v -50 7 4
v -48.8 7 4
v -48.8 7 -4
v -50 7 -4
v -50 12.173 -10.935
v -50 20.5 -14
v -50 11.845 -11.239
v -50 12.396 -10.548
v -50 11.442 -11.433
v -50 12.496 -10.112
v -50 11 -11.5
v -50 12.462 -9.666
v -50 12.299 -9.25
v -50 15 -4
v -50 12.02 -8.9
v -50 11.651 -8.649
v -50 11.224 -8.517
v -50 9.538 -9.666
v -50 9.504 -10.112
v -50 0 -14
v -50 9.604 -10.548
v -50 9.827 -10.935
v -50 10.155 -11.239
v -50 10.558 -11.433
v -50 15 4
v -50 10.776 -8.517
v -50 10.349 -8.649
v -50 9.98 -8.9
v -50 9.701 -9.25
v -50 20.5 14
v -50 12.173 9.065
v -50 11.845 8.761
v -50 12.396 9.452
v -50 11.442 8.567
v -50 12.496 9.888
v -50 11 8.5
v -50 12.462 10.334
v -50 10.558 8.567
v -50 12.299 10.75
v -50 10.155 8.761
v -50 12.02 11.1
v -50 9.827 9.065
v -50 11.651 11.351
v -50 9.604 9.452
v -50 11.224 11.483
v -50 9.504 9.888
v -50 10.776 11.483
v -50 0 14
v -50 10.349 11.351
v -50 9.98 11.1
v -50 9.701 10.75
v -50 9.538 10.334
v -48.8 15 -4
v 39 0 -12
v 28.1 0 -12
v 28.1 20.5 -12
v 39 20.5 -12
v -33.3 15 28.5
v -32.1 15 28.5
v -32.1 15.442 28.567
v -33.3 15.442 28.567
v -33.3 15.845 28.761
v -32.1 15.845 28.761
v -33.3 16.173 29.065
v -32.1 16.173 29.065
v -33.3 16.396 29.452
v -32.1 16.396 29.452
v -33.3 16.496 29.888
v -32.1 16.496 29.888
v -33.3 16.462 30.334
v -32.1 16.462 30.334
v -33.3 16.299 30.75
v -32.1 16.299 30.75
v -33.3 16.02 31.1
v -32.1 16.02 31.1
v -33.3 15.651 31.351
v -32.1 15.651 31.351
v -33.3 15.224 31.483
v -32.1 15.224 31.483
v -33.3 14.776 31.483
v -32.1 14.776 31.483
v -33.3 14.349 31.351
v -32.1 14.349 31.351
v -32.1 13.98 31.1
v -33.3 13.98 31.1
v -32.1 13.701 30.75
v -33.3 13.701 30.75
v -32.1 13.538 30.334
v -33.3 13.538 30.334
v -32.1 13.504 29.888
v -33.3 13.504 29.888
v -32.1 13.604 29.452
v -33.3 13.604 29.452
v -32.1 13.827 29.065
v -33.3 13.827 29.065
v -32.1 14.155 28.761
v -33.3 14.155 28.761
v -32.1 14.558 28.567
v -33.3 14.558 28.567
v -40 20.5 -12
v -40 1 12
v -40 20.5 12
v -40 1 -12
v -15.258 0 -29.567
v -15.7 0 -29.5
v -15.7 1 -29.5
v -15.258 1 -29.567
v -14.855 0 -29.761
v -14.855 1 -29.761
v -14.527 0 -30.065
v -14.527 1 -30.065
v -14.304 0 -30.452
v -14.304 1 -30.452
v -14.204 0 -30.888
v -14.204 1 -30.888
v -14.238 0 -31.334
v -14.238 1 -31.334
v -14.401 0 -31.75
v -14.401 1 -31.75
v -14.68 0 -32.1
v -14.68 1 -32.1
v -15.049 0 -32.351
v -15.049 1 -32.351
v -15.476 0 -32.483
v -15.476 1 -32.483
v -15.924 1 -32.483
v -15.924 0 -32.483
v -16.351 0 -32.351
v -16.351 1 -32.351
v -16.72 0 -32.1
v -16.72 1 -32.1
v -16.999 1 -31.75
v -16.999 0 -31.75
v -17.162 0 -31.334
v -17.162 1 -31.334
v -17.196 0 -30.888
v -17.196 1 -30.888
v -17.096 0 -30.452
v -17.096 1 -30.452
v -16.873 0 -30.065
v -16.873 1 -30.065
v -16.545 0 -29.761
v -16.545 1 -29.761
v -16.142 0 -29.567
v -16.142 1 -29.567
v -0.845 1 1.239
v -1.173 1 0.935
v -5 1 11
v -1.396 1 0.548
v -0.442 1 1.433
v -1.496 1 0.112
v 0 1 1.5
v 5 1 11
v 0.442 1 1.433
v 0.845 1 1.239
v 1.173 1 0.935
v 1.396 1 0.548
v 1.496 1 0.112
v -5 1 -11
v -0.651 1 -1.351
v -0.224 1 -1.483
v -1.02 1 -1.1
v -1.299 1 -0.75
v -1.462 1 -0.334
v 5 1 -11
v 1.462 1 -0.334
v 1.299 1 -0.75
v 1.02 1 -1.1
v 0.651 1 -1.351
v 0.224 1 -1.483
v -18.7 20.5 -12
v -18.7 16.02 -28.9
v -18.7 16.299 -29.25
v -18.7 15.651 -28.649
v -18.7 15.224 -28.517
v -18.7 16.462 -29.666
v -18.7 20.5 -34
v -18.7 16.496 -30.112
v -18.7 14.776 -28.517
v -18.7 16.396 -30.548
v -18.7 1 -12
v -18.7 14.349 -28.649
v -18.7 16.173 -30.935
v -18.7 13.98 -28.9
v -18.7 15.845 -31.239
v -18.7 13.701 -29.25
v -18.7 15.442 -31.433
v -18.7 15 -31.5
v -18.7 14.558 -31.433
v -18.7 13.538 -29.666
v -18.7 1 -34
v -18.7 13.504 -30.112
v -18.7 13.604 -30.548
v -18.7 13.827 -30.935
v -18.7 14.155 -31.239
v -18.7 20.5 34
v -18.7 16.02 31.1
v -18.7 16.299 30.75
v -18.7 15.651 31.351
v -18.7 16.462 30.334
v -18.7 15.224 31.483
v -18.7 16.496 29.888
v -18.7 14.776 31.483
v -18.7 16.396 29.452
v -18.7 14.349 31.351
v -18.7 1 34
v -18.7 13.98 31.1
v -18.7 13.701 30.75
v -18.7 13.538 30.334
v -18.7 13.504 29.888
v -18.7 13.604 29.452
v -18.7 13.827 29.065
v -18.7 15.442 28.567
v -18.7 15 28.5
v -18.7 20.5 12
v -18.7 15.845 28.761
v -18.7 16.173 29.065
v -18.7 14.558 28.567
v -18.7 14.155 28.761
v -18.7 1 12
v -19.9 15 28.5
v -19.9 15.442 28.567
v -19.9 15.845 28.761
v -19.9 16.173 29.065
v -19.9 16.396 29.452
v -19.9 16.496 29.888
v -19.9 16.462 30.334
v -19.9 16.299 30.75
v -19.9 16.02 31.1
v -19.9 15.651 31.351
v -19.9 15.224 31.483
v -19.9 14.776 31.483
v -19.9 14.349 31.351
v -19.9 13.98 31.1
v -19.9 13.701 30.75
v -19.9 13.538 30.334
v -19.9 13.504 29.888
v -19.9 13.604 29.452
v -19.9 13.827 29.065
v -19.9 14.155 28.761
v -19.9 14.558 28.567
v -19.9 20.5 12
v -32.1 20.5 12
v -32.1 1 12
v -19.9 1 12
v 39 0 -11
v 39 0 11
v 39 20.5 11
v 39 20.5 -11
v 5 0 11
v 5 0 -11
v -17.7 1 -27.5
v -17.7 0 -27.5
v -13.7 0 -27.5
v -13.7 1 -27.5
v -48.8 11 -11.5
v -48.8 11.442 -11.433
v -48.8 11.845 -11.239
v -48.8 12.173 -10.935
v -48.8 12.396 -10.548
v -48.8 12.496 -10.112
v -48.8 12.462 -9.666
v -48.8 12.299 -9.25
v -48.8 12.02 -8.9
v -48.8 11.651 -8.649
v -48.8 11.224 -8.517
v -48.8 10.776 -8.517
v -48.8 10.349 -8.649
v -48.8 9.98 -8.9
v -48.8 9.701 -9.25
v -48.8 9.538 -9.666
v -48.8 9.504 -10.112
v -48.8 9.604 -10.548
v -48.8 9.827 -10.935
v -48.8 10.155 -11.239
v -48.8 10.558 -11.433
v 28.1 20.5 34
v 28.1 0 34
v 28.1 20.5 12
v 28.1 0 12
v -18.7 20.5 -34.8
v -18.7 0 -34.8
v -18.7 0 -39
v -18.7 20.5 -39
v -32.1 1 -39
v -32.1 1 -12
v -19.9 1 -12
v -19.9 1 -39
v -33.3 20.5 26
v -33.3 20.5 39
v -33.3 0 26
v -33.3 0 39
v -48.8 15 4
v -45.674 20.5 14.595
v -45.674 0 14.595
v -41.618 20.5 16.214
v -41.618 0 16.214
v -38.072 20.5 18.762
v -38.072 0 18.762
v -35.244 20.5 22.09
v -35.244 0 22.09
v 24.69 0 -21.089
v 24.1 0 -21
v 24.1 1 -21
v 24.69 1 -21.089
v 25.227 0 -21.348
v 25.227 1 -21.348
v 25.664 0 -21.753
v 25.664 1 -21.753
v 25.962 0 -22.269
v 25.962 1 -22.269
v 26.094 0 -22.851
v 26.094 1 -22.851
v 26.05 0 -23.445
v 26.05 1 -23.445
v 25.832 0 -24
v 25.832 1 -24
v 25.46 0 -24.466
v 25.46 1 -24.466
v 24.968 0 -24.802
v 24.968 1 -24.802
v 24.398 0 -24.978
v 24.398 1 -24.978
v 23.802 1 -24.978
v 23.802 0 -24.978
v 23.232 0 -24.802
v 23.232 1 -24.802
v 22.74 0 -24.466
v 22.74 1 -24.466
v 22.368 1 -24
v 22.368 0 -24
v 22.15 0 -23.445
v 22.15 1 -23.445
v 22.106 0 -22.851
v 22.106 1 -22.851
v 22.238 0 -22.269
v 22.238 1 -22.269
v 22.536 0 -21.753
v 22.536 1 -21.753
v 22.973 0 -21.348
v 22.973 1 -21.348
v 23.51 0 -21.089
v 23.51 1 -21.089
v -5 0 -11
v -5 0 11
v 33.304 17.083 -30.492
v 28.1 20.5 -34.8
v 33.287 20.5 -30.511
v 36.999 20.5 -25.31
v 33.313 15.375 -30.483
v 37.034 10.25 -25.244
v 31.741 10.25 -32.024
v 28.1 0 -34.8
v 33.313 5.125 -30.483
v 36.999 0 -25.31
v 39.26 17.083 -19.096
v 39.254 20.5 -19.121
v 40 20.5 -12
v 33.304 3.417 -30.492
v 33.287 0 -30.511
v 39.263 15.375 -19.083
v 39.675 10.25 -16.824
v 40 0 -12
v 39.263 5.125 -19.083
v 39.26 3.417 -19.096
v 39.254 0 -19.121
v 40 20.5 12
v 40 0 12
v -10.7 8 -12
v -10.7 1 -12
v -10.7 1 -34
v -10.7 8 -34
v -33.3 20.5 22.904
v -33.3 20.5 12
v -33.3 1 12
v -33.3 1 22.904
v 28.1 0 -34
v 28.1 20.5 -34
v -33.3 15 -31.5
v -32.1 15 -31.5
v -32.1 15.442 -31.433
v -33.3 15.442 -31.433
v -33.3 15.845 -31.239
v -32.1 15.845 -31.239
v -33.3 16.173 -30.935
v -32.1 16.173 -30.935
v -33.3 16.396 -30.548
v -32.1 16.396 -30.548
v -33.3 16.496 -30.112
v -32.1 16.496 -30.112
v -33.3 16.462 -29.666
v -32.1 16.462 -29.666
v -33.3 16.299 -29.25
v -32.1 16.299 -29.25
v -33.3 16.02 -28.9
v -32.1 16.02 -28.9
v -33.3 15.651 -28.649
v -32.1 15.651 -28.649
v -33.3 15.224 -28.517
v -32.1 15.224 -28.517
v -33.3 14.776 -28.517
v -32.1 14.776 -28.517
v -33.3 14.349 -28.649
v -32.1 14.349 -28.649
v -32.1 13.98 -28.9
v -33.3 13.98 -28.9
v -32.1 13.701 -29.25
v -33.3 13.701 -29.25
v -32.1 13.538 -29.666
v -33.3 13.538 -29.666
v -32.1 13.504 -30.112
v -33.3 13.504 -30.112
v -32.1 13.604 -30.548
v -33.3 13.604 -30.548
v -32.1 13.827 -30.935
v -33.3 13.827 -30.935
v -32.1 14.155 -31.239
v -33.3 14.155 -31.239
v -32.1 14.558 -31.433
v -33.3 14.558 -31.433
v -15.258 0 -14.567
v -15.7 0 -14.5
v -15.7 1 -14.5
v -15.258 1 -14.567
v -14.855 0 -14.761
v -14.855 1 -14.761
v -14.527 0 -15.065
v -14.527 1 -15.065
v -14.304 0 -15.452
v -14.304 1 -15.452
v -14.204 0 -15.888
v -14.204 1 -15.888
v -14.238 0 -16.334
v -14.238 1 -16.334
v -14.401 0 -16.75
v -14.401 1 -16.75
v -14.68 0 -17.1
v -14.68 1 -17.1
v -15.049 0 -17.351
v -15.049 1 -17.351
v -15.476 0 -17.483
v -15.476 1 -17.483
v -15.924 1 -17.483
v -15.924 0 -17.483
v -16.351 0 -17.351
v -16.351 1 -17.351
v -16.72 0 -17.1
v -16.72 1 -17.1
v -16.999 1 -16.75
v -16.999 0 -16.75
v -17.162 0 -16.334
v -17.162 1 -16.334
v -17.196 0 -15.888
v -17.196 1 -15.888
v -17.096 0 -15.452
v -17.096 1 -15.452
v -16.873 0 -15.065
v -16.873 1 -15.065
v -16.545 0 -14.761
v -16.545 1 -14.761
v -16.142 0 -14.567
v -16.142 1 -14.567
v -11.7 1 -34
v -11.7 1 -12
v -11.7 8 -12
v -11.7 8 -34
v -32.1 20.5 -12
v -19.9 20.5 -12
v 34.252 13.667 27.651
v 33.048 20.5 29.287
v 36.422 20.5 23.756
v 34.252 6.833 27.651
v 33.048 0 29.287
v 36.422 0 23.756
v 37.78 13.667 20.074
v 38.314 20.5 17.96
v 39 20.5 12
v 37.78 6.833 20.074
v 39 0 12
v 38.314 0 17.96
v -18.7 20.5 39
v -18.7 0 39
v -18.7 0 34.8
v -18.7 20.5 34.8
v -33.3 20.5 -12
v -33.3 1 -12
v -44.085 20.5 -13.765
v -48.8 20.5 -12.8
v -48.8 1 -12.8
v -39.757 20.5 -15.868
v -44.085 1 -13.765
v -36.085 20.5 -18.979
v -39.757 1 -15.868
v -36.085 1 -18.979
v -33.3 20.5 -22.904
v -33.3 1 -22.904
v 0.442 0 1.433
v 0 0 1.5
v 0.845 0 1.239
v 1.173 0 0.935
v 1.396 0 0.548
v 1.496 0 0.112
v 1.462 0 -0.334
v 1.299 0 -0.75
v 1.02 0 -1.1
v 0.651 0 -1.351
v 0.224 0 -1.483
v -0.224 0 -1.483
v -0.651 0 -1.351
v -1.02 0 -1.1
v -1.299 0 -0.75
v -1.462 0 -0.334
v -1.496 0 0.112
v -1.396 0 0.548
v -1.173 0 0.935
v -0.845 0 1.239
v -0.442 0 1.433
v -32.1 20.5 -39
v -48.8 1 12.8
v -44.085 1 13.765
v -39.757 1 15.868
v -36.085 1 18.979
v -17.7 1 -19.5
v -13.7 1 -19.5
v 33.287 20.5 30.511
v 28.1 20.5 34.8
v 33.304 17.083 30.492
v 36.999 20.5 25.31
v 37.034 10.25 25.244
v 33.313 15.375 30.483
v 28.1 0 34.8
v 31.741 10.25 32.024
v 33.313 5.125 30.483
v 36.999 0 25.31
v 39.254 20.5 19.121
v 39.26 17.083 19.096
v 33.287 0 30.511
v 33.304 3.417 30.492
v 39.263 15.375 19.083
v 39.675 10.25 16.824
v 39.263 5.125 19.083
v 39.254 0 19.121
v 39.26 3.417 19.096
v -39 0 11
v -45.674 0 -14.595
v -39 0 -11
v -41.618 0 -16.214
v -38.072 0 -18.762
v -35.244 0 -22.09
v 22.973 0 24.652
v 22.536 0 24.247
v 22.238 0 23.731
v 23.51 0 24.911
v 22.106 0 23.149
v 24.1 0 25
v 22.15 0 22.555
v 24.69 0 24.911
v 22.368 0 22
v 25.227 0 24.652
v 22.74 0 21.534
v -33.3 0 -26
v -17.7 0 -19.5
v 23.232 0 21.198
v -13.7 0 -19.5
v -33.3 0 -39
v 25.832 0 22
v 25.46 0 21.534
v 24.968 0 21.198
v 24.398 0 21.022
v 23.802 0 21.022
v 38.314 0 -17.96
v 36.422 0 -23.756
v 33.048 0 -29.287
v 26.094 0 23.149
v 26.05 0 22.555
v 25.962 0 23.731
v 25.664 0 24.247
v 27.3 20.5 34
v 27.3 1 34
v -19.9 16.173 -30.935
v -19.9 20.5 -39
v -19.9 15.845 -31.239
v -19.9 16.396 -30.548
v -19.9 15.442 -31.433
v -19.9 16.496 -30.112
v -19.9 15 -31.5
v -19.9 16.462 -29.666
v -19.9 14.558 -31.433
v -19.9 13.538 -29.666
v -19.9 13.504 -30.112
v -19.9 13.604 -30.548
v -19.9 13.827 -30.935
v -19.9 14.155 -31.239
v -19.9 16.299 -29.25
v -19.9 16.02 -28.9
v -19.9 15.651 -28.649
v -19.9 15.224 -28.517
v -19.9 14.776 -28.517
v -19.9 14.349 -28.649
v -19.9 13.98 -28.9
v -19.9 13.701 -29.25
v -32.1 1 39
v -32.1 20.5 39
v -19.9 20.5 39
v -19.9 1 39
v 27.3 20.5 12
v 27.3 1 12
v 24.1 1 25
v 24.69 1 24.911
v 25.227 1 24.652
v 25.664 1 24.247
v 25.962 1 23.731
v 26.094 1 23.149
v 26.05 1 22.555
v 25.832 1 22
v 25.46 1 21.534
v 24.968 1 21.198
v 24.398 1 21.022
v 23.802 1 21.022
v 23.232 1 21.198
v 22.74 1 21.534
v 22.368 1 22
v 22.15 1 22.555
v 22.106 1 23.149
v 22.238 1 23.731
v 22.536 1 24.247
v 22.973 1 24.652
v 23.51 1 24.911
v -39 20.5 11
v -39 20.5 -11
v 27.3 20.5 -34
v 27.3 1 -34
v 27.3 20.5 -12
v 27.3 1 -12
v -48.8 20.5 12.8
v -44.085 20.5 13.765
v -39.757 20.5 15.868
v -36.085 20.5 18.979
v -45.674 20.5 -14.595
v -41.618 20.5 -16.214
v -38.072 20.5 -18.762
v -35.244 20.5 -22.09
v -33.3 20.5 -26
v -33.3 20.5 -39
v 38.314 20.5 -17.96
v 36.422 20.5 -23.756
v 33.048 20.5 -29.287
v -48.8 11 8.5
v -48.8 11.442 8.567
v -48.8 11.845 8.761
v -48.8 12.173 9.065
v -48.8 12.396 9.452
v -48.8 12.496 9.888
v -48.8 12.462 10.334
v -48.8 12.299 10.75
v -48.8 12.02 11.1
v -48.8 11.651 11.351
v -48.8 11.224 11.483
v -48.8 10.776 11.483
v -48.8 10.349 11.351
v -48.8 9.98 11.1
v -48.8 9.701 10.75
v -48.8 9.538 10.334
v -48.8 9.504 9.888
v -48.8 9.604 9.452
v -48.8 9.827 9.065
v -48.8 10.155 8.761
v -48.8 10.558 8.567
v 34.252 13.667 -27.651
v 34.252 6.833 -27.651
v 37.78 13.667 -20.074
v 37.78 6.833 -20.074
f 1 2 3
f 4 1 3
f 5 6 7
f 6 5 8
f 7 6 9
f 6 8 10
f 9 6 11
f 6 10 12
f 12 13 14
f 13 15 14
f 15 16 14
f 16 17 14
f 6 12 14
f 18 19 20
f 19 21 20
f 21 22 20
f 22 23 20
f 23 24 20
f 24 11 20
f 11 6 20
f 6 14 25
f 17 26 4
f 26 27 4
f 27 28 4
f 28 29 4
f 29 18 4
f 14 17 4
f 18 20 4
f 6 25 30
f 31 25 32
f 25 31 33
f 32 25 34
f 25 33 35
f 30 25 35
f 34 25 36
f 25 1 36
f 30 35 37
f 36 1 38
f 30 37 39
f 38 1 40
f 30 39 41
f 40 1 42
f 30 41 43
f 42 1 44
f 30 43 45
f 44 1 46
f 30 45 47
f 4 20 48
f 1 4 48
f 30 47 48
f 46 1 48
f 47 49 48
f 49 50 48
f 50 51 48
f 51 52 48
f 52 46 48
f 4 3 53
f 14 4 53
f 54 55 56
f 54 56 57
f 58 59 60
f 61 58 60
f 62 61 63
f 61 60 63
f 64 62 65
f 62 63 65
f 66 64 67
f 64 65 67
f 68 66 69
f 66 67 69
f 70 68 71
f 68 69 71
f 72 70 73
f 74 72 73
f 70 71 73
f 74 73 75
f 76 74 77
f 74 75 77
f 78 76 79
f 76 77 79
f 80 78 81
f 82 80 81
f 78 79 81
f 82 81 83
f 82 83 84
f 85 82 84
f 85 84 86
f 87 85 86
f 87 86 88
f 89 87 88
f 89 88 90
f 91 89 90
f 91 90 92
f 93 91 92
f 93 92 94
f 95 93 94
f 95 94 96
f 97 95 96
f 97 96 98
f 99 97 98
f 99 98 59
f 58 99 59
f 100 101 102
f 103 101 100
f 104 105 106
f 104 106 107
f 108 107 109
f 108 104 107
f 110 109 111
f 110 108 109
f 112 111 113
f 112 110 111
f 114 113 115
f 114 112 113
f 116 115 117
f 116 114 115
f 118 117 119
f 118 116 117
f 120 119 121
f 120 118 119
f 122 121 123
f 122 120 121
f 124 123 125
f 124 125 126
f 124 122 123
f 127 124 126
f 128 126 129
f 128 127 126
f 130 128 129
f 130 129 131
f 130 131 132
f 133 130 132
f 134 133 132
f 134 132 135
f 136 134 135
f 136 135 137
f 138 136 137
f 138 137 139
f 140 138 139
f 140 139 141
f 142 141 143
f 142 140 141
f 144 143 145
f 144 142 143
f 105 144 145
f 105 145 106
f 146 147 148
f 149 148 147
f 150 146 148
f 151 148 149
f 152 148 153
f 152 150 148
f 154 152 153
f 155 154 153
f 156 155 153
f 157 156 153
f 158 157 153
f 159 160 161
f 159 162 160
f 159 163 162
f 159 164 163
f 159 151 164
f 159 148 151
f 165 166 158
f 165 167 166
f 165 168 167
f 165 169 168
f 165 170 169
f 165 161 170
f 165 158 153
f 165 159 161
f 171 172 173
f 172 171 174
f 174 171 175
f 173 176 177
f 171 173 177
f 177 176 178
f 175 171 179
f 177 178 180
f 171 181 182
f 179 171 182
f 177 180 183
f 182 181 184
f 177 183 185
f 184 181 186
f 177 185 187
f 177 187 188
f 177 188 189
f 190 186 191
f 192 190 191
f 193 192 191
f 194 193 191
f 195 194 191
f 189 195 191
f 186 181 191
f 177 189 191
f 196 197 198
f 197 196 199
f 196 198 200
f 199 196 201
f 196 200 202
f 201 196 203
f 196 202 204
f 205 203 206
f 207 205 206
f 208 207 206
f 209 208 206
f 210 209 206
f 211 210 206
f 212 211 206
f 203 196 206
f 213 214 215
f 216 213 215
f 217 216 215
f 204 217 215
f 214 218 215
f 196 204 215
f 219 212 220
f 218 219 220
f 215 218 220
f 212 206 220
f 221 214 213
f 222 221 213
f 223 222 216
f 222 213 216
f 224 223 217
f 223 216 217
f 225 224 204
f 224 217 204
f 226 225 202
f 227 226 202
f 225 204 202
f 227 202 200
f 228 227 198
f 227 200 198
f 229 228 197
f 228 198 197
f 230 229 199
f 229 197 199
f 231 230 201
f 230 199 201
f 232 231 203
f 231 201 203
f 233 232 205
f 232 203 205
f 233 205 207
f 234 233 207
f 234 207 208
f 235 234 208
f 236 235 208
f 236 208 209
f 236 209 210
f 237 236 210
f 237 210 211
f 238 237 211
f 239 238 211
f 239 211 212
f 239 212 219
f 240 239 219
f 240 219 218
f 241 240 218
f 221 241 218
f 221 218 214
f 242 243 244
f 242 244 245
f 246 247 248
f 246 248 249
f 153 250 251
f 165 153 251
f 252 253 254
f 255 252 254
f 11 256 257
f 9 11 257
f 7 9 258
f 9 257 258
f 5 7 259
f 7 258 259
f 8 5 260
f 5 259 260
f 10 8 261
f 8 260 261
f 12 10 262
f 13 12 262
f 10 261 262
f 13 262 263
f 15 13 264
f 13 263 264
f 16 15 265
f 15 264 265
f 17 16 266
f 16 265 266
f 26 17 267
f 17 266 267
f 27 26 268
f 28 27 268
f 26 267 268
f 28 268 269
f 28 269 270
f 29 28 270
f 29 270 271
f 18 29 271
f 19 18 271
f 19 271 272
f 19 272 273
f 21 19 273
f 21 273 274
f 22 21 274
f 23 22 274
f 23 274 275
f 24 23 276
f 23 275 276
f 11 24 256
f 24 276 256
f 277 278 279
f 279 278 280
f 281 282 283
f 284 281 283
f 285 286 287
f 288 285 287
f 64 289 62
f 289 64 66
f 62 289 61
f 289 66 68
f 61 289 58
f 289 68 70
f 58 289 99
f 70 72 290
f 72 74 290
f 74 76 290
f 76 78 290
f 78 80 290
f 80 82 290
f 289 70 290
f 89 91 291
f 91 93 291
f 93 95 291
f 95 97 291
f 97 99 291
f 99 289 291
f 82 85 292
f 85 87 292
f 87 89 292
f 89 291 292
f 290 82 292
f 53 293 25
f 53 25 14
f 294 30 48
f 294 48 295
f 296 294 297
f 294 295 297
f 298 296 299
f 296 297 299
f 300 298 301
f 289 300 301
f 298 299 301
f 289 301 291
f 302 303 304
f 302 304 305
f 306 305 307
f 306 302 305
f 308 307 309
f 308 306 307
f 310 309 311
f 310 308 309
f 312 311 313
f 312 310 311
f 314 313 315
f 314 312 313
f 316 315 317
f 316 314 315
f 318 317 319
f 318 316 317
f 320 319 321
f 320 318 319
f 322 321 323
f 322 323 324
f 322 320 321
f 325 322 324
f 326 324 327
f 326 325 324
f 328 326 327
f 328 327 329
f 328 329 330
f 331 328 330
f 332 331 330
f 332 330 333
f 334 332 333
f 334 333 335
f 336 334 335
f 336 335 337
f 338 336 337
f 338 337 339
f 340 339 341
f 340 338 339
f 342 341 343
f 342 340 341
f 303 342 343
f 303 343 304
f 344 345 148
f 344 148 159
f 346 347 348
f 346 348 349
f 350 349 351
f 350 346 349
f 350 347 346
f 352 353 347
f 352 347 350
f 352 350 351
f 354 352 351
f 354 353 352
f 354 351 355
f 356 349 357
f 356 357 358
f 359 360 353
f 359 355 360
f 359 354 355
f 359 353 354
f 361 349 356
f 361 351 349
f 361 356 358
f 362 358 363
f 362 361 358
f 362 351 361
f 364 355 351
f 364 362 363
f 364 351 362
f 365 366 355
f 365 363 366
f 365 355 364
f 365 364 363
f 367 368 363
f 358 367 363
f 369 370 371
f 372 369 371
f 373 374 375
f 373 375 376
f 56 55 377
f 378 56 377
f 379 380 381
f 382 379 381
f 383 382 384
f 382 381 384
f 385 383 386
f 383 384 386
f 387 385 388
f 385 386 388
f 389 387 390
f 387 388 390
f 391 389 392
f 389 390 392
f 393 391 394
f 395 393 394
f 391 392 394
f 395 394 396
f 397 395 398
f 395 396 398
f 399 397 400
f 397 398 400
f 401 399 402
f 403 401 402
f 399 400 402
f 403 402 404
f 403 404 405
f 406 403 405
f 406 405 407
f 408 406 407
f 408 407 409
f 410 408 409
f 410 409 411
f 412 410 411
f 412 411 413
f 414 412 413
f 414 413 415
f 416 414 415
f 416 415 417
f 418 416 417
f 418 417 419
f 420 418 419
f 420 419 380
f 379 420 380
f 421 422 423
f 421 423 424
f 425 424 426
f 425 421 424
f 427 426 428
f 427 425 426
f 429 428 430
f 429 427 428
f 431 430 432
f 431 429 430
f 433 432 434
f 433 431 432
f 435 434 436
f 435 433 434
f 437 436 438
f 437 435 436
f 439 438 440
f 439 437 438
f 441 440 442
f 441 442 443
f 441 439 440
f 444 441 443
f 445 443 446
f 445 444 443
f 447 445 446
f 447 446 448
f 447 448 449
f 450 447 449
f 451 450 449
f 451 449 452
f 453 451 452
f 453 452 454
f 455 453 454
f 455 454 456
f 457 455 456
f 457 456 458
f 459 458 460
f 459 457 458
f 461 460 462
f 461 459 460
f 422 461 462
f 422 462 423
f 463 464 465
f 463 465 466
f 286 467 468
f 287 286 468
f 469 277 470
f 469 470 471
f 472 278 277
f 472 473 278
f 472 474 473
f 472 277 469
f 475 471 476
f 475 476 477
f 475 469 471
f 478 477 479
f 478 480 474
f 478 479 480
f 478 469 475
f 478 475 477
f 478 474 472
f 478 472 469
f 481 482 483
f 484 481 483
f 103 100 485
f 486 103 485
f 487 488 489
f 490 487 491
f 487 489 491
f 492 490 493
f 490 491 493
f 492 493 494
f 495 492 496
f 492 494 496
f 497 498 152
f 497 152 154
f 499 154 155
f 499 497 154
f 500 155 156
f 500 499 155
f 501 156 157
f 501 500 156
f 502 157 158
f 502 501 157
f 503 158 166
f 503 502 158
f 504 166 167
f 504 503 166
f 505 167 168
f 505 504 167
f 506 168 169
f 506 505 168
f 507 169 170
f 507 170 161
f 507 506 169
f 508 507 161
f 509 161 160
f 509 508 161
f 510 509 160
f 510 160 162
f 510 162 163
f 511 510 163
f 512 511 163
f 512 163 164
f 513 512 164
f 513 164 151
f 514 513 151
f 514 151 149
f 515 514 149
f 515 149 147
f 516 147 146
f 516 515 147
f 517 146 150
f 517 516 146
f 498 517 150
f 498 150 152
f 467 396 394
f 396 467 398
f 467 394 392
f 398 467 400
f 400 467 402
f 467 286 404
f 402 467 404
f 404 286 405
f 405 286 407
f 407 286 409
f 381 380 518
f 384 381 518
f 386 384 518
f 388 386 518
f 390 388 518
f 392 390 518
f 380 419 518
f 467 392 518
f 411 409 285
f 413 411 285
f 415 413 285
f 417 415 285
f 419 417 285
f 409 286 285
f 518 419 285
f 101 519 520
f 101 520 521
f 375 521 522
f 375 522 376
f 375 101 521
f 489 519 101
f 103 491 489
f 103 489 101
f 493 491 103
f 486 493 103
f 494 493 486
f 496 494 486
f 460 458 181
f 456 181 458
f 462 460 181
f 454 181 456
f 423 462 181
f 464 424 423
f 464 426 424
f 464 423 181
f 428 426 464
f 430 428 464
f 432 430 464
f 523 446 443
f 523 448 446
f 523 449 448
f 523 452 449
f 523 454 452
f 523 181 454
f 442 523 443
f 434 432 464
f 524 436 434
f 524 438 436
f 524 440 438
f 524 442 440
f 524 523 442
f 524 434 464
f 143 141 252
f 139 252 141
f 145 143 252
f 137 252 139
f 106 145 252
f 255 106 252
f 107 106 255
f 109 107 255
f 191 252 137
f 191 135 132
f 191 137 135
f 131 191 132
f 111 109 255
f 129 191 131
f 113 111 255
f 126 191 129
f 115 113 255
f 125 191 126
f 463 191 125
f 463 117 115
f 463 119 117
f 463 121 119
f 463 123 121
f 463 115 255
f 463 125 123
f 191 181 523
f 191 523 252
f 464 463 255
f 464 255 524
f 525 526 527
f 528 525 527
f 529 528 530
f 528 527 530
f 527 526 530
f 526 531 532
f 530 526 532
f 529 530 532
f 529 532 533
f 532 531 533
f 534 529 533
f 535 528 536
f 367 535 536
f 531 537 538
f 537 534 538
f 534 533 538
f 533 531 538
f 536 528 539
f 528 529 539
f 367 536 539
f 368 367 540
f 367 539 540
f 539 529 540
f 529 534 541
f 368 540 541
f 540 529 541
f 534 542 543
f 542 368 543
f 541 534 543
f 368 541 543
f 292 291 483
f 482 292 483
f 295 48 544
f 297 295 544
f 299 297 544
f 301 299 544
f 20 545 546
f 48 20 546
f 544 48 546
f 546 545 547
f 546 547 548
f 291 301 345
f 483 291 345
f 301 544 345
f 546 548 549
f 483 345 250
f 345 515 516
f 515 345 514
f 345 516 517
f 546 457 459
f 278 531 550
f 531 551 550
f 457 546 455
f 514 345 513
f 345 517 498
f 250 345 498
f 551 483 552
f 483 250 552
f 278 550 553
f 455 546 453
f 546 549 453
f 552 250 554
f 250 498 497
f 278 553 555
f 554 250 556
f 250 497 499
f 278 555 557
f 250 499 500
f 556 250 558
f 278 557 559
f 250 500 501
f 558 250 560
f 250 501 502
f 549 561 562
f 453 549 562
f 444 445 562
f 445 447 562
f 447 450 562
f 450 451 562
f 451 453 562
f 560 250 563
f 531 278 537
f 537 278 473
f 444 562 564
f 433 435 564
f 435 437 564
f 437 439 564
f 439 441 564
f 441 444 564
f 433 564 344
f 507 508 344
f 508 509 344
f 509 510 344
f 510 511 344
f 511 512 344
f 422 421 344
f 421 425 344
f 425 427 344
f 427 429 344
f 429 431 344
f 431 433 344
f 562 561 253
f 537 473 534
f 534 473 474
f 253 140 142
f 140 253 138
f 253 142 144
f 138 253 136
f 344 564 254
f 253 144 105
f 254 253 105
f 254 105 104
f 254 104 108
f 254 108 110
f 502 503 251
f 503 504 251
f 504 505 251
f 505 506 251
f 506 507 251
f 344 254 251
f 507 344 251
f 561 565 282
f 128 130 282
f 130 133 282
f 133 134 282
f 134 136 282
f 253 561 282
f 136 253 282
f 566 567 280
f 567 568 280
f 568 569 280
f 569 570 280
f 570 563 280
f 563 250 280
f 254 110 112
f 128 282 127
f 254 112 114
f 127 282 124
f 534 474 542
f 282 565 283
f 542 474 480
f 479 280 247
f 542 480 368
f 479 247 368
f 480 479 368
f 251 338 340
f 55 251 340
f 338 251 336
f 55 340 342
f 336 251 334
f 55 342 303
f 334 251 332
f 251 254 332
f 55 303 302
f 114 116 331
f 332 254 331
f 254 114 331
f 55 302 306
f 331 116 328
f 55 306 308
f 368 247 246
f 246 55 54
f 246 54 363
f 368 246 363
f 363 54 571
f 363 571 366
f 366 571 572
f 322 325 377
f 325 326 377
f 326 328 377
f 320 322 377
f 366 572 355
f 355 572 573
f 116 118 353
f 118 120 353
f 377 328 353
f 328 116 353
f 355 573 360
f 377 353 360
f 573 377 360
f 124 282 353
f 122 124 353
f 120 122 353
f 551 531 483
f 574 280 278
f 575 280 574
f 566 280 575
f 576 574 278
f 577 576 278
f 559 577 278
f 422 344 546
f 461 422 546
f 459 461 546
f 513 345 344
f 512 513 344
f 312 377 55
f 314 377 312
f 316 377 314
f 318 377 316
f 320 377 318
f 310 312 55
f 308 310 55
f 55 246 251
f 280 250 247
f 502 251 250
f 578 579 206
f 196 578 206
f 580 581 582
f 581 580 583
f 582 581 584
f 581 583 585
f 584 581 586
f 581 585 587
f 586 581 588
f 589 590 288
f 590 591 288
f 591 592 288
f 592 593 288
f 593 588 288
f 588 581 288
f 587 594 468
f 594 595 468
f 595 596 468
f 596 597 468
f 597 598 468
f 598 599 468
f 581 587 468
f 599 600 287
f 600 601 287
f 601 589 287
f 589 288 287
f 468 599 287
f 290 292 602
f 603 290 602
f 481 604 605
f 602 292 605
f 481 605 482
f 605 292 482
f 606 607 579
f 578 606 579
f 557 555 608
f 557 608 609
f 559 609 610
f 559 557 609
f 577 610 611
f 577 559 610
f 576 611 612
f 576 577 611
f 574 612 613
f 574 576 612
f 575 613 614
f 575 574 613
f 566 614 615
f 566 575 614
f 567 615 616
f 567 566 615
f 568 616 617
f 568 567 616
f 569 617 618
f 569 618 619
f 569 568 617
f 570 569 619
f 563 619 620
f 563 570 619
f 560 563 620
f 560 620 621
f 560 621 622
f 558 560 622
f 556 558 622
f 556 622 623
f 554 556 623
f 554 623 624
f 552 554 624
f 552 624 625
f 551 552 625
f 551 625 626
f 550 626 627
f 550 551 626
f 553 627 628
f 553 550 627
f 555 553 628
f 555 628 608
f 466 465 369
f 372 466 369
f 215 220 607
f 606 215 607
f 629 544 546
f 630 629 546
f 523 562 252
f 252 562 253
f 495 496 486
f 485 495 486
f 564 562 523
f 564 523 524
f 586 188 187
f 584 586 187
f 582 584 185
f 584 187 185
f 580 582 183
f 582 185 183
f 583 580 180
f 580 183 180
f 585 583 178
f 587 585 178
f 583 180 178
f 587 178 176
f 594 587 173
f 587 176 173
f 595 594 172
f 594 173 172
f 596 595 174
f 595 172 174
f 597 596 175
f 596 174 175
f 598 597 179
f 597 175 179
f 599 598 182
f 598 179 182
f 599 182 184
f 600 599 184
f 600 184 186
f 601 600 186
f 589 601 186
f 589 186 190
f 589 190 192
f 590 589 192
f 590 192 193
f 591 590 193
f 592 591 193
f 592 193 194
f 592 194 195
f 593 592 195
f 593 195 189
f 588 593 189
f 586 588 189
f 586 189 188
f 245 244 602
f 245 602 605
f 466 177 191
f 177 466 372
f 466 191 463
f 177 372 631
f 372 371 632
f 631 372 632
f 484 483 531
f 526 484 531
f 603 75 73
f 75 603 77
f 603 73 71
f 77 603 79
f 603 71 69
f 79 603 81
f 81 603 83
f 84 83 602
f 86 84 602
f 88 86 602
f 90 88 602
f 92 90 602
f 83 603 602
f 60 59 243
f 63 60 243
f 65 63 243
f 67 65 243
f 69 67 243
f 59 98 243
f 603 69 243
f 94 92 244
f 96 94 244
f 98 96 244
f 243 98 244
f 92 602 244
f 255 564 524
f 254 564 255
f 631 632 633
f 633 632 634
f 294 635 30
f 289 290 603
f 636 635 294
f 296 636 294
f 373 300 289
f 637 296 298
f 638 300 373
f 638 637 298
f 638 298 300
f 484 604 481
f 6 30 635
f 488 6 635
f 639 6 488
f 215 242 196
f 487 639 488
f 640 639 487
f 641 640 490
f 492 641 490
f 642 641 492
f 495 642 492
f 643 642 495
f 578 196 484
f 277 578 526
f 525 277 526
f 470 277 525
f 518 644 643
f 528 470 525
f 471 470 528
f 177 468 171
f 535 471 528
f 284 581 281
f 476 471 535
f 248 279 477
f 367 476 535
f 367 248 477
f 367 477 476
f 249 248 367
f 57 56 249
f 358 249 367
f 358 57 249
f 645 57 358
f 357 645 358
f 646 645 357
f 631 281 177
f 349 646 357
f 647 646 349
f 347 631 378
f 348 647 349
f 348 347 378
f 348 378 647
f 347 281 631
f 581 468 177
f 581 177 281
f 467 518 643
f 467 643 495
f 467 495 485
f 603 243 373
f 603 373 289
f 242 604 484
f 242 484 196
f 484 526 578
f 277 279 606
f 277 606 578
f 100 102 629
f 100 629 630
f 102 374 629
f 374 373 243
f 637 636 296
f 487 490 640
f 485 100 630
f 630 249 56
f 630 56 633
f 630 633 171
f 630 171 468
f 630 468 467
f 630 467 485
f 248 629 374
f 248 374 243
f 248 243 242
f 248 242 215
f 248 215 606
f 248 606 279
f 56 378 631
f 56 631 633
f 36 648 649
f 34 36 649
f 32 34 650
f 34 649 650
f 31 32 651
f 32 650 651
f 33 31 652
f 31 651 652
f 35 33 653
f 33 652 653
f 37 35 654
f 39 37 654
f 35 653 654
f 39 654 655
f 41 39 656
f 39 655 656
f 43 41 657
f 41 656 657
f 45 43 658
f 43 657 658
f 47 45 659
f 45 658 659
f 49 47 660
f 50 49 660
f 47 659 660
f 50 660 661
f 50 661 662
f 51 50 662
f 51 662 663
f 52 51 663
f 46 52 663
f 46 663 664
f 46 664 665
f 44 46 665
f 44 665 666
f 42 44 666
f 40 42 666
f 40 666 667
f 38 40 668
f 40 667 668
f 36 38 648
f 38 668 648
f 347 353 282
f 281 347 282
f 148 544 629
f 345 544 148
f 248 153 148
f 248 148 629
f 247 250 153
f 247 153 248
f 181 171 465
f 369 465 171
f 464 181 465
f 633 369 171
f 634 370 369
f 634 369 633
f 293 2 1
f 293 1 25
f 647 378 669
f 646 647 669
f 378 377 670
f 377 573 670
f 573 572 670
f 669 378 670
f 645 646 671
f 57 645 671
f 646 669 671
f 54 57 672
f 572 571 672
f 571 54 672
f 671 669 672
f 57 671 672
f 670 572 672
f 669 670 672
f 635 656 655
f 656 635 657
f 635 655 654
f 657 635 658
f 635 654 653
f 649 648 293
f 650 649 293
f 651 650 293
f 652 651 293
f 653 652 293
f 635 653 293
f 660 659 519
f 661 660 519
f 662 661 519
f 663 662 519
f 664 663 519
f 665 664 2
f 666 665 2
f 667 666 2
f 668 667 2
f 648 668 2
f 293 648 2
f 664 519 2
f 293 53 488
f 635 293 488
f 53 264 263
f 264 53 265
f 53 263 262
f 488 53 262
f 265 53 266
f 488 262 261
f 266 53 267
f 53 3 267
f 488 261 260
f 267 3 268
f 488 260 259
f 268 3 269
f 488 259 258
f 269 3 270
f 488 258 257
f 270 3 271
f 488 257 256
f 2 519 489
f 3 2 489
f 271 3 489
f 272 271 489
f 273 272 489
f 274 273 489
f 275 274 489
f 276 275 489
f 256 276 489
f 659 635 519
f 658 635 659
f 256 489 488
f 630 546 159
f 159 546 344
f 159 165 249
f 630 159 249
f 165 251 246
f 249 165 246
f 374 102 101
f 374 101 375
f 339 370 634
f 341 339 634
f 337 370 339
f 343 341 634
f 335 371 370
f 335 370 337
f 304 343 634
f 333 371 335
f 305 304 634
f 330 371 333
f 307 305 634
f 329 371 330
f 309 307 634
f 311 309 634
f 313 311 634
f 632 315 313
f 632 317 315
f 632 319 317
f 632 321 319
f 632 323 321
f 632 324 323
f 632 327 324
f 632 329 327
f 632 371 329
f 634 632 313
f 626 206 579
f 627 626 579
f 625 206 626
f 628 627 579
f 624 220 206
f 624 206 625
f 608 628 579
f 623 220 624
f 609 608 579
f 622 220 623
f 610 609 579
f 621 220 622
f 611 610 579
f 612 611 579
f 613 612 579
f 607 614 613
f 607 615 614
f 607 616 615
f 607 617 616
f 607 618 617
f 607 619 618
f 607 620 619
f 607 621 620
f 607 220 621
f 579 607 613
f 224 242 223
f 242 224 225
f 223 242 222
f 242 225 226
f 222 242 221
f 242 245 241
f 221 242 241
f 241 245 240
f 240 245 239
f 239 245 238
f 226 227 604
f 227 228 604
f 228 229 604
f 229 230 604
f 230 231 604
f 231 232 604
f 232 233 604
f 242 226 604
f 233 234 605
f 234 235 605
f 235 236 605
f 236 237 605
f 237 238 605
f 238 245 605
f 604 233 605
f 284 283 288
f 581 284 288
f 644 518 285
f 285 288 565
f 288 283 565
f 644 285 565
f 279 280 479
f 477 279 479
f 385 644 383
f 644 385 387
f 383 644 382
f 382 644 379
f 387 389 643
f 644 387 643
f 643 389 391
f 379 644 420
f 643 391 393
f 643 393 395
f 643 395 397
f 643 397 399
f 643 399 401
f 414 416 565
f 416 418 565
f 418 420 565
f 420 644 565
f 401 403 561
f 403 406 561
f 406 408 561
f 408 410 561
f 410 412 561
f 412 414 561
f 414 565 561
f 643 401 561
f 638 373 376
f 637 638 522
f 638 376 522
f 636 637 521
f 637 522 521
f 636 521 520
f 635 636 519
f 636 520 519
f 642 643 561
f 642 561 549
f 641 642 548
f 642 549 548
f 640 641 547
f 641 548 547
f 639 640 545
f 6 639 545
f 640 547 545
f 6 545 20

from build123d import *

# Parameters (mm, degrees)
SKETCH_2_W          = 80
SKETCH_2_H          = 24
SKETCH_2_W_2        = 78
SKETCH_2_H_2        = 22
EXTRUDE_3130_DEPTH  = 20.5
SKETCH_2_3_W        = 10
SKETCH_2_3_H        = 22
SKETCH_2_3_R        = 1.5
SKETCH_2_3_W_2      = 46
SKETCH_2_3_R_2      = 2
SKETCH_2_3_W_3      = 4
SKETCH_2_3_H_2      = 8
SKETCH_2_3_W_4      = 12.2
SKETCH_2_3_H_3      = 27
EXTRUDE_3218_DEPTH  = 1
CUT_EXTRUDE_START   = -18.7
SKETCH_3_R          = 1.5
CUT_EXTRUDE_1_DEPTH = 14.6
CUT_EXTRUDE_START_2 = -48.8
SKETCH_3_2_R        = 1.5
SKETCH_3_2_W        = 8
SKETCH_3_2_H        = 8
CUT_EXTRUDE_2_DEPTH = 1.2
SKETCH_2_5_W        = 1
SKETCH_2_5_H        = 22
EXTRUDE_4_DEPTH     = 8


with BuildPart() as part:
    # Эскиз2 → Extrude 3130 (new body)
    # profile 1 of 8: a face of its own
    with BuildSketch(Plane(origin=(0, 0, 0), x_dir=(1, 0, 0), z_dir=(0, 1, 0))):
        Rectangle(SKETCH_2_W, SKETCH_2_H)
        Rectangle(SKETCH_2_W_2, SKETCH_2_H_2, mode=Mode.SUBTRACT)
    # profile 2 of 8: a face of its own
    with BuildSketch(Plane(origin=(0, 0, 0), x_dir=(1, 0, 0), z_dir=(0, 1, 0))):
        with BuildLine():
            Line((-33.3, -39), (-32.1, -39))
            Line((-32.1, -39), (-32.1, -12))
            Line((-32.1, -12), (-33.3, -12))
            Line((-33.3, -12), (-33.3, -22.903910844))
            ThreePointArc((-33.3, -22.903910844), (-39.756802154, -15.868113034), (-48.8, -12.8))
            Line((-48.8, -12.8), (-48.8, 12.8))
            ThreePointArc((-48.8, 12.8), (-39.756802154, 15.868113034), (-33.3, 22.903910844))
            Line((-33.3, 22.903910844), (-33.3, 12))
            Line((-33.3, 12), (-32.1, 12))
            Line((-32.1, 12), (-32.1, 39))
            Line((-32.1, 39), (-33.3, 39))
            Line((-33.3, 39), (-33.3, 26))
            ThreePointArc((-33.3, 26), (-39.767640231, 17.380382655), (-50, 14))
            Line((-50, 14), (-50, -14))
            ThreePointArc((-50, -14), (-39.767640231, -17.380382655), (-33.3, -26))
            Line((-33.3, -26), (-33.3, -39))
        make_face()
    # profile 3 of 8: a face of its own
    with BuildSketch(Plane(origin=(0, 0, 0), x_dir=(1, 0, 0), z_dir=(0, 1, 0))):
        Polygon((-18.7, 34), (-18.7, 34.8), (-18.7, 39), (-19.9, 39), (-19.9, 12), (-18.7, 12), align=None)
    # profile 4 of 8: a face of its own
    with BuildSketch(Plane(origin=(0, 0, 0), x_dir=(1, 0, 0), z_dir=(0, 1, 0))):
        Polygon((-18.7, -39), (-18.7, -34.8), (-18.7, -34), (-18.7, -12), (-19.9, -12), (-19.9, -39), align=None)
    # profile 5 of 8: a face of its own
    with BuildSketch(Plane(origin=(0, 0, 0), x_dir=(1, 0, 0), z_dir=(0, 1, 0))):
        Polygon((28.1, 34), (28.1, 34.8), (-18.7, 34.8), (-18.7, 34), (-11.7, 34), (-10.7, 34), (27.3, 34), (27.3, 12), (28.1, 12), align=None)
    # profile 6 of 8: a face of its own
    with BuildSketch(Plane(origin=(0, 0, 0), x_dir=(1, 0, 0), z_dir=(0, 1, 0))):
        with BuildLine():
            Line((39, 12), (40, 12))
            add(Edge.make_bspline(
                [(28.1, 34.8), (40.01829159, 27.087388808), (40, 12)],
                knots=[0, 0, 0, 1, 1, 1], degree=2))
            Line((28.1, 34.8), (28.1, 34))
            add(Edge.make_bspline(
                [(28.1, 34), (35.667325964, 28.510032971), (38.830570785, 20.077982561), (39, 12)],
                knots=[0, 0, 0, 0, 1, 1, 1, 1], degree=3))
        make_face()
    # profile 7 of 8: a face of its own
    with BuildSketch(Plane(origin=(0, 0, 0), x_dir=(1, 0, 0), z_dir=(0, 1, 0))):
        Polygon((-18.7, -34.8), (28.1, -34.8), (28.1, -34), (28.1, -12), (27.3, -12), (27.3, -34), (-18.7, -34), align=None)
    # profile 8 of 8: a face of its own
    with BuildSketch(Plane(origin=(0, 0, 0), x_dir=(1, 0, 0), z_dir=(0, 1, 0))):
        with BuildLine():
            add(Edge.make_bspline(
                [(28.1, -34.8), (40.01829159, -27.087388808), (40, -12)],
                knots=[0, 0, 0, 1, 1, 1], degree=2))
            Line((40, -12), (39, -12))
            add(Edge.make_bspline(
                [(28.1, -34), (35.667325964, -28.510032971), (38.830570785, -20.077982561), (39, -12)],
                knots=[0, 0, 0, 0, 1, 1, 1, 1], degree=3))
            Line((28.1, -34), (28.1, -34.8))
        make_face()
    extrude(amount=EXTRUDE_3130_DEPTH)

    # Эскиз2<3> → Extrude 3218 (add)
    # profile 1 of 6: a face of its own
    with BuildSketch(Plane(origin=(0, 0, 0), x_dir=(1, 0, 0), z_dir=(0, 1, 0))):
        Rectangle(SKETCH_2_3_W, SKETCH_2_3_H)
        with Locations(Location((0, 0, 0), (0, 0, 270))):
            Circle(SKETCH_2_3_R, mode=Mode.SUBTRACT)
    # profile 2 of 6: a face of its own
    with BuildSketch(Plane(origin=(0, 0, 0), x_dir=(1, 0, 0), z_dir=(0, 1, 0))):
        with Locations((4.3, -23)):
            Rectangle(SKETCH_2_3_W_2, SKETCH_2_3_H)
        with Locations(Location((24.1, -23, 0), (0, 0, 270))):
            Circle(SKETCH_2_3_R_2, mode=Mode.SUBTRACT)
    # profile 3 of 6: a face of its own
    with BuildSketch(Plane(origin=(0, 0, 0), x_dir=(1, 0, 0), z_dir=(0, 1, 0))):
        with Locations((4.3, 23)):
            Rectangle(SKETCH_2_3_W_2, SKETCH_2_3_H)
        with Locations(Location((24.1, 23, 0), (0, 0, 270))):
            Circle(SKETCH_2_3_R_2, mode=Mode.SUBTRACT)
        with Locations(Location((-15.7, 31, 0), (0, 0, 270))):
            Circle(SKETCH_2_3_R, mode=Mode.SUBTRACT)
        with Locations(Location((-15.7, 16, 0), (0, 0, 270))):
            Circle(SKETCH_2_3_R, mode=Mode.SUBTRACT)
        with Locations((-15.7, 23.5)):
            Rectangle(SKETCH_2_3_W_3, SKETCH_2_3_H_2, mode=Mode.SUBTRACT)
    # profile 4 of 6: a face of its own
    with BuildSketch(Plane(origin=(0, 0, 0), x_dir=(1, 0, 0), z_dir=(0, 1, 0))):
        with Locations((-26, -25.5)):
            Rectangle(SKETCH_2_3_W_4, SKETCH_2_3_H_3)
    # profile 5 of 6: a face of its own
    with BuildSketch(Plane(origin=(0, 0, 0), x_dir=(1, 0, 0), z_dir=(0, 1, 0))):
        with Locations((-26, 25.5)):
            Rectangle(SKETCH_2_3_W_4, SKETCH_2_3_H_3)
    # profile 6 of 6: a face of its own
    with BuildSketch(Plane(origin=(0, 0, 0), x_dir=(1, 0, 0), z_dir=(0, 1, 0))):
        with BuildLine():
            Line((-33.3, -22.903910844), (-33.3, -12))
            Line((-33.3, -12), (-40, -12))
            Line((-40, -12), (-40, 12))
            Line((-40, 12), (-33.3, 12))
            Line((-33.3, 12), (-33.3, 22.903910844))
            ThreePointArc((-33.3, 22.903910844), (-39.756802154, 15.868113034), (-48.8, 12.8))
            Line((-48.8, 12.8), (-48.8, -12.8))
            ThreePointArc((-48.8, -12.8), (-39.756802154, -15.868113034), (-33.3, -22.903910844))
        make_face()
    extrude(amount=EXTRUDE_3218_DEPTH)

    # Эскиз3 → Вырез-Вытянуть1 (cut)
    with BuildSketch(Plane(origin=(0, 0, 0), x_dir=(0, 0, -1), z_dir=(1, 0, 0)).offset(CUT_EXTRUDE_START)):
        with Locations((-30, 15)):
            Circle(SKETCH_3_R)
        with Locations((30, 15)):
            Circle(SKETCH_3_R)
    extrude(amount=-CUT_EXTRUDE_1_DEPTH, mode=Mode.SUBTRACT)

    # Эскиз3<2> → Вырез-Вытянуть2 (cut)
    with BuildSketch(Plane(origin=(0, 0, 0), x_dir=(0, 0, -1), z_dir=(1, 0, 0)).offset(CUT_EXTRUDE_START_2)):
        with Locations((30, 15)):
            Circle(SKETCH_3_2_R)
        with Locations((-30, 15)):
            Circle(SKETCH_3_2_R)
        with Locations((-10, 11)):
            Circle(SKETCH_3_2_R)
        with Locations((10, 11)):
            Circle(SKETCH_3_2_R)
        with Locations((0, 11)):
            Rectangle(SKETCH_3_2_W, SKETCH_3_2_H)
    extrude(amount=-CUT_EXTRUDE_2_DEPTH, mode=Mode.SUBTRACT)

    # Эскиз2<5> → Бобышка-Вытянуть4 (add)
    with BuildSketch(Plane(origin=(0, 0, 0), x_dir=(1, 0, 0), z_dir=(0, 1, 0))):
        with Locations((-11.2, 23)):
            Rectangle(SKETCH_2_5_W, SKETCH_2_5_H)
    extrude(amount=EXTRUDE_4_DEPTH)


solid = part.part
